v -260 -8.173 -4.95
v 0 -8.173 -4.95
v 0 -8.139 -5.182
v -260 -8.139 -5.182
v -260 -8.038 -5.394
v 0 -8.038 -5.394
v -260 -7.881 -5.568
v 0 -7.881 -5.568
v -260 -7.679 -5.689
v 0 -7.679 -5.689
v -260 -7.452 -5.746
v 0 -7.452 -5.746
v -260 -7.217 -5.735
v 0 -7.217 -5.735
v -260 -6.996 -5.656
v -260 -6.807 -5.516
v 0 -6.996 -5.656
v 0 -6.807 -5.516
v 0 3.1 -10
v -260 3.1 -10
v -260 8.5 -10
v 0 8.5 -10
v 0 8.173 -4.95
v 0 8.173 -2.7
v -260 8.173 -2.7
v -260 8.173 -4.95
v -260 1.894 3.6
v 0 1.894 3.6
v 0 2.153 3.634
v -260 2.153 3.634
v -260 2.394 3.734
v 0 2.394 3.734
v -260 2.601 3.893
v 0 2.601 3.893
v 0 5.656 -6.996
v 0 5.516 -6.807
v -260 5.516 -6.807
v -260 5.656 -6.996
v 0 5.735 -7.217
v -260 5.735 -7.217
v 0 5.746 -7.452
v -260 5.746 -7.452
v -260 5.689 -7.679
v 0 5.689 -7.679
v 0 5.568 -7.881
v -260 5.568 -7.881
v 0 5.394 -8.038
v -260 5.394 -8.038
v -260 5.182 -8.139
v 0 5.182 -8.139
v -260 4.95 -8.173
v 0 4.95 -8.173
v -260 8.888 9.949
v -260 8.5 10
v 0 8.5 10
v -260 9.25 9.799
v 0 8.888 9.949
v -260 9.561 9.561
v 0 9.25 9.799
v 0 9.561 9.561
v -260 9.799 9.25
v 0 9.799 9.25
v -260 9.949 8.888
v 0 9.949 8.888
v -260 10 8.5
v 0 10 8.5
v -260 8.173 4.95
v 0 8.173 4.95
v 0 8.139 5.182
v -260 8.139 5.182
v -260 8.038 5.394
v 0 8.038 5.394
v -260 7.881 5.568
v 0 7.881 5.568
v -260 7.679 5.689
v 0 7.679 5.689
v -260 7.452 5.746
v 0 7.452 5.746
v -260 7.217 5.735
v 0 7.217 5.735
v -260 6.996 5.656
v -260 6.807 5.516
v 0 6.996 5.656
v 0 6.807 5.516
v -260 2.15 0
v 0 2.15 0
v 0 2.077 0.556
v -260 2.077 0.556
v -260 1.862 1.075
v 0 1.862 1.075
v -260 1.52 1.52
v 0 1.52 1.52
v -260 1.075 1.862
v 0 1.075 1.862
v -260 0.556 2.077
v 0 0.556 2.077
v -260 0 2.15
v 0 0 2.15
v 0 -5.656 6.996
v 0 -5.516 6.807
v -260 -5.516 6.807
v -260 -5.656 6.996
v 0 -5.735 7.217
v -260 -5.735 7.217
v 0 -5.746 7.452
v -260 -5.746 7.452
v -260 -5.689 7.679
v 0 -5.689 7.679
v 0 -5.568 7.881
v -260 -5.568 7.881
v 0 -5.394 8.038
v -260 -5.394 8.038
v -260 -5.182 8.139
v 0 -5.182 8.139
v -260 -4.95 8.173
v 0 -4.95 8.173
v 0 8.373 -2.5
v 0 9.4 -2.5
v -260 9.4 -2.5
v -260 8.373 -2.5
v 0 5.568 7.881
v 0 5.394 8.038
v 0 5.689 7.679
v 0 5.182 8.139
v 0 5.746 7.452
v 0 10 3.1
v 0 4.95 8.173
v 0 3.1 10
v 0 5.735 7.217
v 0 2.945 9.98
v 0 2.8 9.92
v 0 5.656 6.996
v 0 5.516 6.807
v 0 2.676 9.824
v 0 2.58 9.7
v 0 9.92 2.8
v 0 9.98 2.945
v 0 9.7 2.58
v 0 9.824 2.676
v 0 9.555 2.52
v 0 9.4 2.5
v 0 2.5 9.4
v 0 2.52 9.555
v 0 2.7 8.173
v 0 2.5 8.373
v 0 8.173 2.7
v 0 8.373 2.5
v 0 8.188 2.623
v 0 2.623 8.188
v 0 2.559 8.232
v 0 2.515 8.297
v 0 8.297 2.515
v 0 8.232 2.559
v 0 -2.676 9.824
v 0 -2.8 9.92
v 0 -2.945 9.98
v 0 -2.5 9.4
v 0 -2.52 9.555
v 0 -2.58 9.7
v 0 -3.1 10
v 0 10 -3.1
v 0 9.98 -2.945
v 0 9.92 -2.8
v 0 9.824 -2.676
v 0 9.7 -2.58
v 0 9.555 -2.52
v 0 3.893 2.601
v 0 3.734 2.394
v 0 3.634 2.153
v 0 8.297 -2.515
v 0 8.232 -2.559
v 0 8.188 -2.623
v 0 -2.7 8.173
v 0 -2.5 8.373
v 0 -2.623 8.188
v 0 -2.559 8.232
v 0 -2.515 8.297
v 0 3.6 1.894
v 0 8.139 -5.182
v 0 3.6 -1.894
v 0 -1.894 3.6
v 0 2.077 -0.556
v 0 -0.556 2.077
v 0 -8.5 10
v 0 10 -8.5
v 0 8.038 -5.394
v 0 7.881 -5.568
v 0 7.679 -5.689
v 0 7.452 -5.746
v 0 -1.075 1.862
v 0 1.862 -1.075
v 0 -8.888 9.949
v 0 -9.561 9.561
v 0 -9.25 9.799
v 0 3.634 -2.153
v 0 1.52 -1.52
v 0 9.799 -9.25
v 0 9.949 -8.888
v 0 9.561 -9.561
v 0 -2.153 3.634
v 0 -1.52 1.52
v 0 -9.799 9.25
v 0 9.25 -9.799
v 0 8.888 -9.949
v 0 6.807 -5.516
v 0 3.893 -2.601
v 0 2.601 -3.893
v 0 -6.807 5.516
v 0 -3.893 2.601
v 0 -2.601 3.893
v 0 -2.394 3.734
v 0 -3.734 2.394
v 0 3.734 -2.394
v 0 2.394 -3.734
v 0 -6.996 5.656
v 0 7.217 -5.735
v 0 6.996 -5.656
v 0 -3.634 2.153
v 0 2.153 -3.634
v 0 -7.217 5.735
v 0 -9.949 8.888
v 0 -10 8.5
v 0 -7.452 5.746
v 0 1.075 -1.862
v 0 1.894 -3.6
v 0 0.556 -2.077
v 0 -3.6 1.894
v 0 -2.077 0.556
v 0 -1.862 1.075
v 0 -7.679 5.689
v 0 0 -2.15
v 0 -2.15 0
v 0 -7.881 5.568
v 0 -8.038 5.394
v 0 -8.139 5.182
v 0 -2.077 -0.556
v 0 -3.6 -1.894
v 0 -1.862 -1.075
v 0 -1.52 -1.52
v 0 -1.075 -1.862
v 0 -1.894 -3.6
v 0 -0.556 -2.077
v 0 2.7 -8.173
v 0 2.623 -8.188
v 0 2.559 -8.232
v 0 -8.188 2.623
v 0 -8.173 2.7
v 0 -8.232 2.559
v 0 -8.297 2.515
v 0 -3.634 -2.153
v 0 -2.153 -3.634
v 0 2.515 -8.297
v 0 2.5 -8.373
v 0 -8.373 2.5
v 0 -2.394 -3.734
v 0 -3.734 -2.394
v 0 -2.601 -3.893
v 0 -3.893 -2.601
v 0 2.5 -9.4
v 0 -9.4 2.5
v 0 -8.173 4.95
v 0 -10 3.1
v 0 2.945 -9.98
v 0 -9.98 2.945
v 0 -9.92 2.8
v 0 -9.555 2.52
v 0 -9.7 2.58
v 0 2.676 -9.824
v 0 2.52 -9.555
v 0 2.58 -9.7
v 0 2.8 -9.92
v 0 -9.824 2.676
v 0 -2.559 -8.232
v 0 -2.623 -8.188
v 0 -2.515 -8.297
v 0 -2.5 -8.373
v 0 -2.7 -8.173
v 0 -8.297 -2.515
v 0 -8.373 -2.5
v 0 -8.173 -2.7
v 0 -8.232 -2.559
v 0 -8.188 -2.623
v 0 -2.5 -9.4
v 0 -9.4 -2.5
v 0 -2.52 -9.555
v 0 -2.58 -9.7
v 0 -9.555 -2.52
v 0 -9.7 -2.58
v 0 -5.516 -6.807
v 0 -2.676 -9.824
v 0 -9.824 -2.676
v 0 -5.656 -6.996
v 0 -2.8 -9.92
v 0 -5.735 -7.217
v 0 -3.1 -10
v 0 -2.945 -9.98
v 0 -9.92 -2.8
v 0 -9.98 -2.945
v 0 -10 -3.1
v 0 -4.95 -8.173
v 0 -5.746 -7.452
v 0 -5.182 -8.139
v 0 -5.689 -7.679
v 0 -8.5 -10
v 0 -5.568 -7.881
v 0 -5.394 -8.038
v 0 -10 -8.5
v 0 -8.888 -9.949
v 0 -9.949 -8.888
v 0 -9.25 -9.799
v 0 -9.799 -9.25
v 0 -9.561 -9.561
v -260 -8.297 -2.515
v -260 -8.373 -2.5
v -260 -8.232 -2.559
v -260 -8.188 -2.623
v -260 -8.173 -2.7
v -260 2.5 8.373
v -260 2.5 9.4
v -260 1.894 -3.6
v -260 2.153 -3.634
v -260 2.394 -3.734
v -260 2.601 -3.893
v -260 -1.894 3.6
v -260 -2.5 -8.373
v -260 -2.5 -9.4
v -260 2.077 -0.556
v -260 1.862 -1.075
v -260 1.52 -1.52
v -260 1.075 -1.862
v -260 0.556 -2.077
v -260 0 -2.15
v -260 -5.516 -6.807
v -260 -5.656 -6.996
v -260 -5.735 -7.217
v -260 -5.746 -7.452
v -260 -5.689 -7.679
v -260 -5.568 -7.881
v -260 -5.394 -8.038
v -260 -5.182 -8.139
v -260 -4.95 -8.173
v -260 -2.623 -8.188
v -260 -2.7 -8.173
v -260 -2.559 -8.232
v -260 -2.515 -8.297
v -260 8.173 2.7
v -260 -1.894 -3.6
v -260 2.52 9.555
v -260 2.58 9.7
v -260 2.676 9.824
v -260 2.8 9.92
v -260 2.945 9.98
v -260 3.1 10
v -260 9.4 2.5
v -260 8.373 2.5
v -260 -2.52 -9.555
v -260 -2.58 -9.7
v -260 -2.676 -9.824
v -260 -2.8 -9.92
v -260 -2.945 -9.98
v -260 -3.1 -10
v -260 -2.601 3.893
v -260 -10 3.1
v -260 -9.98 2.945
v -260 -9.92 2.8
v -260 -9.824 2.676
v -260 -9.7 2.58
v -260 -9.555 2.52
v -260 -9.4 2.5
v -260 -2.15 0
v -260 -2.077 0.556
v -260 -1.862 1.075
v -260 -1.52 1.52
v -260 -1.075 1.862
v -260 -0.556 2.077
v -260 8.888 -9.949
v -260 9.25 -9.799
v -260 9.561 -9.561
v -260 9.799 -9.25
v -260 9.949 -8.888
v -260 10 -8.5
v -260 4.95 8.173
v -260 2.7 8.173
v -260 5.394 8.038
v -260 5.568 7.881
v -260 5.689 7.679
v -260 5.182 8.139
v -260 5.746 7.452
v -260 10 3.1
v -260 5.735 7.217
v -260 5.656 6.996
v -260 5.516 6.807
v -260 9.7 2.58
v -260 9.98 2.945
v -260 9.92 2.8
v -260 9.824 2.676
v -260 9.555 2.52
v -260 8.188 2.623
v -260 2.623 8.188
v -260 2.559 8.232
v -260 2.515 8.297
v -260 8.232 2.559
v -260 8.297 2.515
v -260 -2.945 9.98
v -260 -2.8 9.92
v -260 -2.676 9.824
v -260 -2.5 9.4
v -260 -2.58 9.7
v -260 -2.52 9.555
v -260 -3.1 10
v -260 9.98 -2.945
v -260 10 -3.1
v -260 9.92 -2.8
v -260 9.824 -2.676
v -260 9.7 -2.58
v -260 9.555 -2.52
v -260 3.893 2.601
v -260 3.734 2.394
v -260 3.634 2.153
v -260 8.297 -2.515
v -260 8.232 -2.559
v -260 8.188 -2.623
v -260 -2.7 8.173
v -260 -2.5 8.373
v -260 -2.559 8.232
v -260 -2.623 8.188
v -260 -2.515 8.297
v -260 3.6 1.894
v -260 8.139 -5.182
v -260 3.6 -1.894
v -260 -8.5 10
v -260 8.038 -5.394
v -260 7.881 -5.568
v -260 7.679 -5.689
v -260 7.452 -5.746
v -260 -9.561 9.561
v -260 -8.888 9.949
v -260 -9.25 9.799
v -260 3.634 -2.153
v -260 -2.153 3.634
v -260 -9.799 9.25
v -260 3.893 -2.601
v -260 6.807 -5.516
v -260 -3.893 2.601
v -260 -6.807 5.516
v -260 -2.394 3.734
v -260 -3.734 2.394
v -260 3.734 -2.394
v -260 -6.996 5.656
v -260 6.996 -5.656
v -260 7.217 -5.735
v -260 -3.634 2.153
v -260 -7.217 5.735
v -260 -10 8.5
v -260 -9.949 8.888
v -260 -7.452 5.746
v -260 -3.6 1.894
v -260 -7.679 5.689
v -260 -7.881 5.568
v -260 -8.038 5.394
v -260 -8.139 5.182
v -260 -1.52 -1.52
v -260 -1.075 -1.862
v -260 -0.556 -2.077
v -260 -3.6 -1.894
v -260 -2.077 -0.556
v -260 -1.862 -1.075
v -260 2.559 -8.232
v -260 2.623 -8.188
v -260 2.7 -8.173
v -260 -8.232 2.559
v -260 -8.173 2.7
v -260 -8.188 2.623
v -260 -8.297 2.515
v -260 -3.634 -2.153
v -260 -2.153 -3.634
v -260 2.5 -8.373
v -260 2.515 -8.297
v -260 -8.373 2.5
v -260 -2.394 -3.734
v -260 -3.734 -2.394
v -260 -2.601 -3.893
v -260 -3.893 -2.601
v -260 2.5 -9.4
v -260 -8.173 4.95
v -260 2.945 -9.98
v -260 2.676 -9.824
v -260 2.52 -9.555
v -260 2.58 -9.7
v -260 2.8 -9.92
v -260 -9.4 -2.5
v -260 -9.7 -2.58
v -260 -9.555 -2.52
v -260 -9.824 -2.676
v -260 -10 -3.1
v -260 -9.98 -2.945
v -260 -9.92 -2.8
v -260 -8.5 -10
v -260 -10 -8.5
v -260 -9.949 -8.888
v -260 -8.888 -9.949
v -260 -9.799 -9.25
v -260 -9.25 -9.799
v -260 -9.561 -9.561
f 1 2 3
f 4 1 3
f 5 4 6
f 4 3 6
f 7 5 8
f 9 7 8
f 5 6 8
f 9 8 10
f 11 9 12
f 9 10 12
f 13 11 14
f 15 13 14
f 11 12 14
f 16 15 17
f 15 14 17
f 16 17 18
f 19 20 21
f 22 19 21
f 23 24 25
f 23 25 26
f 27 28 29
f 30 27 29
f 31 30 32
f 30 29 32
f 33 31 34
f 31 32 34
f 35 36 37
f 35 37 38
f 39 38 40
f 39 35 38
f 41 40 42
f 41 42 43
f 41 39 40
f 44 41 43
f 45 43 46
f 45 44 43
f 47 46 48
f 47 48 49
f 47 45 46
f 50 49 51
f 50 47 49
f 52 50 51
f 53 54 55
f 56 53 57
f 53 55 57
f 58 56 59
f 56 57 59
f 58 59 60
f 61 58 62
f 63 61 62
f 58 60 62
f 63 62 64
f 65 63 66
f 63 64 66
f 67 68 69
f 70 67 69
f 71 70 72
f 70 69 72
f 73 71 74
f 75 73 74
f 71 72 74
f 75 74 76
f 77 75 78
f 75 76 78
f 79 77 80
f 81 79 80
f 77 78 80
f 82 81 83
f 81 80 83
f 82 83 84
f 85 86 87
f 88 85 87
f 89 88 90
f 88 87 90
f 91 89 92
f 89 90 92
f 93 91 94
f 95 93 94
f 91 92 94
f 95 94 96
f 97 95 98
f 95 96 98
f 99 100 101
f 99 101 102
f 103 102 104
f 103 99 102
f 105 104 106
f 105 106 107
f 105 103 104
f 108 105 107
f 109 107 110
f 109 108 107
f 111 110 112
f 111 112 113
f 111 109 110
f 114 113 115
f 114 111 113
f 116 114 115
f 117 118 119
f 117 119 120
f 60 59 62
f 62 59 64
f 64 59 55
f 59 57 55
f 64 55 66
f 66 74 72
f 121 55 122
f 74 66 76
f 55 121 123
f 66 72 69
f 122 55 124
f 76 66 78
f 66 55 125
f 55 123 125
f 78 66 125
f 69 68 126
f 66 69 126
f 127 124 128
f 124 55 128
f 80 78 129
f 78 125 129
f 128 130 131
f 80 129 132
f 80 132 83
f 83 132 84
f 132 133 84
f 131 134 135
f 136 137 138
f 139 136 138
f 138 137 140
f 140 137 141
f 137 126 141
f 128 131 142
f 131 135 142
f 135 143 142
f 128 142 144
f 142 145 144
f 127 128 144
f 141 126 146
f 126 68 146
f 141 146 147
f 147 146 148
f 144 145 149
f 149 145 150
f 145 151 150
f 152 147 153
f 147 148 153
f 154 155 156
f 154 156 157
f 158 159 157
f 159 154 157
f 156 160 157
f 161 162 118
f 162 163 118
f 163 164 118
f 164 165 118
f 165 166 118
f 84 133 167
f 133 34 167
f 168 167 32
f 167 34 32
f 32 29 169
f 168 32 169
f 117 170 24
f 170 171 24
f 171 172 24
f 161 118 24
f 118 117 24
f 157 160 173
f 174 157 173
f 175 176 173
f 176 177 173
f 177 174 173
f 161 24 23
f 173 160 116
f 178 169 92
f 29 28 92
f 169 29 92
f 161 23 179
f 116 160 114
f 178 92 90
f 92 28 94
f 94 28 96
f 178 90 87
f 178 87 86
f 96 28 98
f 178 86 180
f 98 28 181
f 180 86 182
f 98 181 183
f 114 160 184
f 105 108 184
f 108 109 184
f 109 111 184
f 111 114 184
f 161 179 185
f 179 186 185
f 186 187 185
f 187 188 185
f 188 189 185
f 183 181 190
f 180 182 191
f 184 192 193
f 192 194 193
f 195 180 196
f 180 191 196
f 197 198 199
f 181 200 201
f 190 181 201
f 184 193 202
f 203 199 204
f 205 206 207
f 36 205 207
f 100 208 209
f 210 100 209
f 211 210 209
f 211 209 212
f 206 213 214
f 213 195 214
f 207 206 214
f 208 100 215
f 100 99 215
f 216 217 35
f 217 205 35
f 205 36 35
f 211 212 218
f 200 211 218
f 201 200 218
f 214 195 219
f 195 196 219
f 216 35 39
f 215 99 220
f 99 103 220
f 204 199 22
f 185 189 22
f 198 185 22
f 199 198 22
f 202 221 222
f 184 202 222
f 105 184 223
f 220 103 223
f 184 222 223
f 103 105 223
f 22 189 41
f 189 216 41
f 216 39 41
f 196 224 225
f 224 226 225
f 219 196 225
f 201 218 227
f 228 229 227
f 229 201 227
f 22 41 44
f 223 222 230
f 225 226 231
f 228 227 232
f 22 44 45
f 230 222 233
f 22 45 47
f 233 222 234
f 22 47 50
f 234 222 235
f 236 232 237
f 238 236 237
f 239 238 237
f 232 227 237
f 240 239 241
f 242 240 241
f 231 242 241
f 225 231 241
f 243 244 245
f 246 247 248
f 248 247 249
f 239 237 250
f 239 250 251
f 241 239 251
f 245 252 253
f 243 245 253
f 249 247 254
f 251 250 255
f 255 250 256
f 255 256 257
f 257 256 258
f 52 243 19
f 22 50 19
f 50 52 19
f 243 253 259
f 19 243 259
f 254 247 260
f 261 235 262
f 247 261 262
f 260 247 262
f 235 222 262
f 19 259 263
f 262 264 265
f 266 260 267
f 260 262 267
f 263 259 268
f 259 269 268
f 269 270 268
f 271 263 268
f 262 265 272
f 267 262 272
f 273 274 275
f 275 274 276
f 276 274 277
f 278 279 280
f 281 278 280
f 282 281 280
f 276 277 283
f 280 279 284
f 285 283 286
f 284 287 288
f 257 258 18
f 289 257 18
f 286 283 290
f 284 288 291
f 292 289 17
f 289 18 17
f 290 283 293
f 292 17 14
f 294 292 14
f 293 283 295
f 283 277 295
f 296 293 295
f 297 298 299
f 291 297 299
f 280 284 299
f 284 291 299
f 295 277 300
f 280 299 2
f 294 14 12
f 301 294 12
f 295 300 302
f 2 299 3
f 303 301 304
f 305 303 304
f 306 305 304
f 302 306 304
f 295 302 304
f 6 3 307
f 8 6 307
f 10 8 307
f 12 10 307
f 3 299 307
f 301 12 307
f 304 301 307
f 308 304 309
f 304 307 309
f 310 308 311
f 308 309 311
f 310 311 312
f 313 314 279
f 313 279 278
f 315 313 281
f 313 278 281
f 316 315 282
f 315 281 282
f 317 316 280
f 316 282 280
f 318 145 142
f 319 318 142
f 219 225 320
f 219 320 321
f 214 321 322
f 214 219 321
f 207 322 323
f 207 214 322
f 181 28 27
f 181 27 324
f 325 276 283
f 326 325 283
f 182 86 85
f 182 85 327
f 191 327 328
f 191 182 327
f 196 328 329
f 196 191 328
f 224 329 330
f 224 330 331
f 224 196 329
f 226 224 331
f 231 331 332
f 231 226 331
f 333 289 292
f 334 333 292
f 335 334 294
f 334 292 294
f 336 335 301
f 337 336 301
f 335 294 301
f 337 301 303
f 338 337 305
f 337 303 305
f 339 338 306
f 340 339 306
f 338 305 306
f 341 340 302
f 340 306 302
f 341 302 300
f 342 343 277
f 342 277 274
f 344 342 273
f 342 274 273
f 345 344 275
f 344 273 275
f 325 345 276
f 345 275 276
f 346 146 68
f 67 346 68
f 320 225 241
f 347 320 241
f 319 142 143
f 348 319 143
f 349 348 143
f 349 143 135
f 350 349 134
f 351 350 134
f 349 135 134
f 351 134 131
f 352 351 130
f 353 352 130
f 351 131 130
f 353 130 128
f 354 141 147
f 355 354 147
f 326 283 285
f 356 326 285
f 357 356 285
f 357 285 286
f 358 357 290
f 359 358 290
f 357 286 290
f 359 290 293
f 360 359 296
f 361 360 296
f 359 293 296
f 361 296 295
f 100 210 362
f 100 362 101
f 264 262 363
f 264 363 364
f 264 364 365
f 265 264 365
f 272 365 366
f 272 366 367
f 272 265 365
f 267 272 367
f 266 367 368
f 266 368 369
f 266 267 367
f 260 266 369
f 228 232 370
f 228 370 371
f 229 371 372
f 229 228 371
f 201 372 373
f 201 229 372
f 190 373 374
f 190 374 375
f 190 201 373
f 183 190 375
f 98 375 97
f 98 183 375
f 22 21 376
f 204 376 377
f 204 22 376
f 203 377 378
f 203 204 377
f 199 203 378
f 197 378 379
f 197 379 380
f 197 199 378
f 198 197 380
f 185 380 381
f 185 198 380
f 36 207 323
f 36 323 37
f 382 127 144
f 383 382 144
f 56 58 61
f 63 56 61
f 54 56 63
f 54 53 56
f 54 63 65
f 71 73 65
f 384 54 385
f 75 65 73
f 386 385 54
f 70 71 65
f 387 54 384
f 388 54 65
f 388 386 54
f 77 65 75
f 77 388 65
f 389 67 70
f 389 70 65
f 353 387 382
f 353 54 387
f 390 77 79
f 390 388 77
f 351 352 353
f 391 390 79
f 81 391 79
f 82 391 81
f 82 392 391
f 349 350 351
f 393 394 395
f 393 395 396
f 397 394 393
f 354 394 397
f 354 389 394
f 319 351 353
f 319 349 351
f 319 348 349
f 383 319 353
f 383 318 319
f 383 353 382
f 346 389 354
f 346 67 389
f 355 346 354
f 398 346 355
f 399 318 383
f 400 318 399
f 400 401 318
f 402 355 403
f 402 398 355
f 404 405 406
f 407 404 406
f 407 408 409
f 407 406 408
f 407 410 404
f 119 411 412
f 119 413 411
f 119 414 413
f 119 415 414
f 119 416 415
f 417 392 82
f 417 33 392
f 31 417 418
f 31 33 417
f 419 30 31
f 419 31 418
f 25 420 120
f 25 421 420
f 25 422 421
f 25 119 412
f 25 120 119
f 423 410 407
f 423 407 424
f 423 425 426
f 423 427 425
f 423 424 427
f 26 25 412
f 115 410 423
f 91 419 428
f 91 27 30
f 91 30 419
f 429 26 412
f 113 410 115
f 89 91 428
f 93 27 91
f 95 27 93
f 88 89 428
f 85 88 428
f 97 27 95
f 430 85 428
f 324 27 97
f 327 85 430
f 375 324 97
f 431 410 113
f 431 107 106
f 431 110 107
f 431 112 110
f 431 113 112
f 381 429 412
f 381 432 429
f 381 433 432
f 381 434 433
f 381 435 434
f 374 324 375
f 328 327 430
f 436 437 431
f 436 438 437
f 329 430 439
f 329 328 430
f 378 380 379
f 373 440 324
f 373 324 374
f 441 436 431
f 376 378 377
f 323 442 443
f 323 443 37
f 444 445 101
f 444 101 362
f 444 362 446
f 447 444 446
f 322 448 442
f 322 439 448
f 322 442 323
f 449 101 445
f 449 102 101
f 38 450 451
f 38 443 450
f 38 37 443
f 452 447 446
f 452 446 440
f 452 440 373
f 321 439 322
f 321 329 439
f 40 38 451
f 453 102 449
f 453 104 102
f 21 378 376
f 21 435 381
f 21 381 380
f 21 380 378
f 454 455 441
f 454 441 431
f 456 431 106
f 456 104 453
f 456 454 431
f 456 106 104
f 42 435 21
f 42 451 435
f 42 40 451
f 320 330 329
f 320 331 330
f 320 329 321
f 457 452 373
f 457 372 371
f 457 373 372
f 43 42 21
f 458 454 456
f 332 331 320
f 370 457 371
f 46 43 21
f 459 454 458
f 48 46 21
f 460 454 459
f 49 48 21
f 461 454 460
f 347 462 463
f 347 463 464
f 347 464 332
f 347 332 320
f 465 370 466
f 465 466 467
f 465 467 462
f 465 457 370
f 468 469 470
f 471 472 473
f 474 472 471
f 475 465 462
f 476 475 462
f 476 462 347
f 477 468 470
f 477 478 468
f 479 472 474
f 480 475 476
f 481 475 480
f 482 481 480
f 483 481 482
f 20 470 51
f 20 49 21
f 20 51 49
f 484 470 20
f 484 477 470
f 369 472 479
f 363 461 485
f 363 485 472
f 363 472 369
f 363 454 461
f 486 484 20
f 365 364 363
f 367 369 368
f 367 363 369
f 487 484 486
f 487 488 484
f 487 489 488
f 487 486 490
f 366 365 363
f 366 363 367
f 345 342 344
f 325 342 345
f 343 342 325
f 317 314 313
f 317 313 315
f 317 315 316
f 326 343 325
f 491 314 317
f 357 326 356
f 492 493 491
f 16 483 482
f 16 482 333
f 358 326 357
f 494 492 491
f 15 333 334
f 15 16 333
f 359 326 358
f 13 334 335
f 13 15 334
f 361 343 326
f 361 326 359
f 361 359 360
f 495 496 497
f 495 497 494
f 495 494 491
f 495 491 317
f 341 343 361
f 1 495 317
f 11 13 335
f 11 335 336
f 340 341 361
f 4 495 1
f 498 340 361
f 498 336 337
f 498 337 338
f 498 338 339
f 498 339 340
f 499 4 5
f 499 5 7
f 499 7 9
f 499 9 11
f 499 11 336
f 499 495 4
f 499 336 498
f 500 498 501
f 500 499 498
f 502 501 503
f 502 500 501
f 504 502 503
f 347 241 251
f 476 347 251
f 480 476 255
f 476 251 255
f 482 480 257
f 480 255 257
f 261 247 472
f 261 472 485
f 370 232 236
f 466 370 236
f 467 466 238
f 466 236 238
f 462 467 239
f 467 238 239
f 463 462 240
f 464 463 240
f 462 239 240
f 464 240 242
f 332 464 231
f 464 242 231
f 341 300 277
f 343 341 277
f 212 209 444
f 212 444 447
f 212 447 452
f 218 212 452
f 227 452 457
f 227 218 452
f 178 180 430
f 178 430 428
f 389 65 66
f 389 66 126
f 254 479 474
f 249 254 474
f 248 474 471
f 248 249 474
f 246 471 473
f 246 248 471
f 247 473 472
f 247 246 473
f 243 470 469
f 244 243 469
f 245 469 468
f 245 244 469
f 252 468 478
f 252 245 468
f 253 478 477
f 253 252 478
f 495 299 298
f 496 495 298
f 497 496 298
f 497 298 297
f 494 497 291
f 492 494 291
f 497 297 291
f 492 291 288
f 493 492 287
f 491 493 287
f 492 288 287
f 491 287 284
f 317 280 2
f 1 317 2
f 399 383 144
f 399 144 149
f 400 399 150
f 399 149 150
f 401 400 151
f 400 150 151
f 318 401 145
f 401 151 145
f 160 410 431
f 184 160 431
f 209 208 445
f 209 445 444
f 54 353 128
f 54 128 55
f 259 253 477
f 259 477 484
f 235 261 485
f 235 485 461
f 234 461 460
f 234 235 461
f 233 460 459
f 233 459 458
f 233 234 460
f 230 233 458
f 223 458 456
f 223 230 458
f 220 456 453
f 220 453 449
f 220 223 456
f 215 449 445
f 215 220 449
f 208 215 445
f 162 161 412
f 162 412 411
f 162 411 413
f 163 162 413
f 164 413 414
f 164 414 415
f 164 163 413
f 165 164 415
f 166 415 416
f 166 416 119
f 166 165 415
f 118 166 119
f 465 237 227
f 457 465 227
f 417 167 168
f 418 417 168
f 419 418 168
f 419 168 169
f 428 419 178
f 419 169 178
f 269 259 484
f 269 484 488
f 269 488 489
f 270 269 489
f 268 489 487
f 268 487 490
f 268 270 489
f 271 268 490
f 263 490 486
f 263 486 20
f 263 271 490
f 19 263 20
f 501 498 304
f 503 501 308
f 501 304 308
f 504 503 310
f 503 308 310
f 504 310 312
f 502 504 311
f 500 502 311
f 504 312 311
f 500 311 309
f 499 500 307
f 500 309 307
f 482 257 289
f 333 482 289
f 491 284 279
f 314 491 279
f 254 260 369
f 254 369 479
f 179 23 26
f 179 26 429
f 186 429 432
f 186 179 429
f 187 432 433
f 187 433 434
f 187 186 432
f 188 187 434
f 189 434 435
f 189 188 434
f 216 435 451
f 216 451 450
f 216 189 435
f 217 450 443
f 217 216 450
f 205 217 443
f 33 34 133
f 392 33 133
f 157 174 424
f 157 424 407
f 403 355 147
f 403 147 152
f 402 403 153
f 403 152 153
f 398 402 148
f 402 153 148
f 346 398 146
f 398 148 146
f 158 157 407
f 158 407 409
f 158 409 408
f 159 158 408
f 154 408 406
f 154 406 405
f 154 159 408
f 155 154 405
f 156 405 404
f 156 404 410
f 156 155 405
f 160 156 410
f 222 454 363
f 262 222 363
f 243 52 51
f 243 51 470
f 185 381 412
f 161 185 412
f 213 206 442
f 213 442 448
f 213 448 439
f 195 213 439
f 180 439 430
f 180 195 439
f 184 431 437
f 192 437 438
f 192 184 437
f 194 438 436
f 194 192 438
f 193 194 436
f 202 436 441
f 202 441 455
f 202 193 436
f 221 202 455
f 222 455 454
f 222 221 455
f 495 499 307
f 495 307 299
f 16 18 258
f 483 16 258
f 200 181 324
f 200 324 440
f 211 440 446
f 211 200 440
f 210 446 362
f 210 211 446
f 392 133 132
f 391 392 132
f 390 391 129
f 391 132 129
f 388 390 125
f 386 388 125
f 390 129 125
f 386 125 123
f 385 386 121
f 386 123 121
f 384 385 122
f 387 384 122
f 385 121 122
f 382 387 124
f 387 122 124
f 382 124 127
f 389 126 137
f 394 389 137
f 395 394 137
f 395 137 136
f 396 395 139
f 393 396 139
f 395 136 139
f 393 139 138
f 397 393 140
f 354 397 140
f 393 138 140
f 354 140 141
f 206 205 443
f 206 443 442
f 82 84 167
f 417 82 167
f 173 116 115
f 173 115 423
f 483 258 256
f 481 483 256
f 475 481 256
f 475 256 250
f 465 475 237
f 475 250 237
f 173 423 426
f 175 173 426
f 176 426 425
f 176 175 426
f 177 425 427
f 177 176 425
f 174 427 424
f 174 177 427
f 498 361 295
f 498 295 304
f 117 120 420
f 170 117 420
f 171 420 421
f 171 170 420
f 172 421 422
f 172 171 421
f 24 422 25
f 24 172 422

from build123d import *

# Parameters (mm, degrees)
BOSS_EXTRUDE1_DEPTH = 260


with BuildPart() as part:
    # Sketch3 → Boss-Extrude1 (new body)
    with BuildSketch(Plane(origin=(0, 0, 0), x_dir=(0, 0, -1), z_dir=(1, 0, 0))):
        with BuildLine():
            Line((-5.515685425, 6.807463915), (-2.601114729, 3.892893219))
            ThreePointArc((-2.601114729, 3.892893219), (-2.27669138, 3.676120467), (-1.894007948, 3.6))
            Line((-1.894007948, 3.6), (0, 3.6))
            Line((0, 3.6), (0, 2.15))
            ThreePointArc((0, 2.15), (-1.52027958, 1.52027958), (-2.15, 0))
            Line((-2.15, 0), (-3.6, 0))
            Line((-3.6, 0), (-3.6, 1.894007948))
            ThreePointArc((-3.6, 1.894007948), (-3.676120467, 2.27669138), (-3.892893219, 2.601114729))
            Line((-3.892893219, 2.601114729), (-6.807463915, 5.515685425))
            ThreePointArc((-6.807463915, 5.515685425), (-7.679296086, 5.689103626), (-8.17314934, 4.95))
            Line((-8.17314934, 4.95), (-8.17314934, 2.7))
            ThreePointArc((-8.17314934, 2.7), (-8.231727984, 2.558578644), (-8.37314934, 2.5))
            Line((-8.37314934, 2.5), (-9.4, 2.5))
            ThreePointArc((-9.4, 2.5), (-9.824264069, 2.675735931), (-10, 3.1))
            Line((-10, 3.1), (-10, 8.5))
            ThreePointArc((-10, 8.5), (-9.560660172, 9.560660172), (-8.5, 10))
            Line((-8.5, 10), (-3.1, 10))
            ThreePointArc((-3.1, 10), (-2.675735931, 9.824264069), (-2.5, 9.4))
            Line((-2.5, 9.4), (-2.5, 8.37314934))
            ThreePointArc((-2.5, 8.37314934), (-2.558578644, 8.231727984), (-2.7, 8.17314934))
            Line((-2.7, 8.17314934), (-4.95, 8.17314934))
            ThreePointArc((-4.95, 8.17314934), (-5.689103626, 7.679296086), (-5.515685425, 6.807463915))
        make_face()
    extrude(amount=-BOSS_EXTRUDE1_DEPTH)

    # Mirror1: part across plane


with BuildPart() as part_1:
    add(part.part)
    add(part.part.mirror(Plane.ZX))

    # Mirror2: part across plane


with BuildPart() as part_2:
    add(part_1.part)
    add(part_1.part.mirror(Plane.XY))


solid = part_2.part
